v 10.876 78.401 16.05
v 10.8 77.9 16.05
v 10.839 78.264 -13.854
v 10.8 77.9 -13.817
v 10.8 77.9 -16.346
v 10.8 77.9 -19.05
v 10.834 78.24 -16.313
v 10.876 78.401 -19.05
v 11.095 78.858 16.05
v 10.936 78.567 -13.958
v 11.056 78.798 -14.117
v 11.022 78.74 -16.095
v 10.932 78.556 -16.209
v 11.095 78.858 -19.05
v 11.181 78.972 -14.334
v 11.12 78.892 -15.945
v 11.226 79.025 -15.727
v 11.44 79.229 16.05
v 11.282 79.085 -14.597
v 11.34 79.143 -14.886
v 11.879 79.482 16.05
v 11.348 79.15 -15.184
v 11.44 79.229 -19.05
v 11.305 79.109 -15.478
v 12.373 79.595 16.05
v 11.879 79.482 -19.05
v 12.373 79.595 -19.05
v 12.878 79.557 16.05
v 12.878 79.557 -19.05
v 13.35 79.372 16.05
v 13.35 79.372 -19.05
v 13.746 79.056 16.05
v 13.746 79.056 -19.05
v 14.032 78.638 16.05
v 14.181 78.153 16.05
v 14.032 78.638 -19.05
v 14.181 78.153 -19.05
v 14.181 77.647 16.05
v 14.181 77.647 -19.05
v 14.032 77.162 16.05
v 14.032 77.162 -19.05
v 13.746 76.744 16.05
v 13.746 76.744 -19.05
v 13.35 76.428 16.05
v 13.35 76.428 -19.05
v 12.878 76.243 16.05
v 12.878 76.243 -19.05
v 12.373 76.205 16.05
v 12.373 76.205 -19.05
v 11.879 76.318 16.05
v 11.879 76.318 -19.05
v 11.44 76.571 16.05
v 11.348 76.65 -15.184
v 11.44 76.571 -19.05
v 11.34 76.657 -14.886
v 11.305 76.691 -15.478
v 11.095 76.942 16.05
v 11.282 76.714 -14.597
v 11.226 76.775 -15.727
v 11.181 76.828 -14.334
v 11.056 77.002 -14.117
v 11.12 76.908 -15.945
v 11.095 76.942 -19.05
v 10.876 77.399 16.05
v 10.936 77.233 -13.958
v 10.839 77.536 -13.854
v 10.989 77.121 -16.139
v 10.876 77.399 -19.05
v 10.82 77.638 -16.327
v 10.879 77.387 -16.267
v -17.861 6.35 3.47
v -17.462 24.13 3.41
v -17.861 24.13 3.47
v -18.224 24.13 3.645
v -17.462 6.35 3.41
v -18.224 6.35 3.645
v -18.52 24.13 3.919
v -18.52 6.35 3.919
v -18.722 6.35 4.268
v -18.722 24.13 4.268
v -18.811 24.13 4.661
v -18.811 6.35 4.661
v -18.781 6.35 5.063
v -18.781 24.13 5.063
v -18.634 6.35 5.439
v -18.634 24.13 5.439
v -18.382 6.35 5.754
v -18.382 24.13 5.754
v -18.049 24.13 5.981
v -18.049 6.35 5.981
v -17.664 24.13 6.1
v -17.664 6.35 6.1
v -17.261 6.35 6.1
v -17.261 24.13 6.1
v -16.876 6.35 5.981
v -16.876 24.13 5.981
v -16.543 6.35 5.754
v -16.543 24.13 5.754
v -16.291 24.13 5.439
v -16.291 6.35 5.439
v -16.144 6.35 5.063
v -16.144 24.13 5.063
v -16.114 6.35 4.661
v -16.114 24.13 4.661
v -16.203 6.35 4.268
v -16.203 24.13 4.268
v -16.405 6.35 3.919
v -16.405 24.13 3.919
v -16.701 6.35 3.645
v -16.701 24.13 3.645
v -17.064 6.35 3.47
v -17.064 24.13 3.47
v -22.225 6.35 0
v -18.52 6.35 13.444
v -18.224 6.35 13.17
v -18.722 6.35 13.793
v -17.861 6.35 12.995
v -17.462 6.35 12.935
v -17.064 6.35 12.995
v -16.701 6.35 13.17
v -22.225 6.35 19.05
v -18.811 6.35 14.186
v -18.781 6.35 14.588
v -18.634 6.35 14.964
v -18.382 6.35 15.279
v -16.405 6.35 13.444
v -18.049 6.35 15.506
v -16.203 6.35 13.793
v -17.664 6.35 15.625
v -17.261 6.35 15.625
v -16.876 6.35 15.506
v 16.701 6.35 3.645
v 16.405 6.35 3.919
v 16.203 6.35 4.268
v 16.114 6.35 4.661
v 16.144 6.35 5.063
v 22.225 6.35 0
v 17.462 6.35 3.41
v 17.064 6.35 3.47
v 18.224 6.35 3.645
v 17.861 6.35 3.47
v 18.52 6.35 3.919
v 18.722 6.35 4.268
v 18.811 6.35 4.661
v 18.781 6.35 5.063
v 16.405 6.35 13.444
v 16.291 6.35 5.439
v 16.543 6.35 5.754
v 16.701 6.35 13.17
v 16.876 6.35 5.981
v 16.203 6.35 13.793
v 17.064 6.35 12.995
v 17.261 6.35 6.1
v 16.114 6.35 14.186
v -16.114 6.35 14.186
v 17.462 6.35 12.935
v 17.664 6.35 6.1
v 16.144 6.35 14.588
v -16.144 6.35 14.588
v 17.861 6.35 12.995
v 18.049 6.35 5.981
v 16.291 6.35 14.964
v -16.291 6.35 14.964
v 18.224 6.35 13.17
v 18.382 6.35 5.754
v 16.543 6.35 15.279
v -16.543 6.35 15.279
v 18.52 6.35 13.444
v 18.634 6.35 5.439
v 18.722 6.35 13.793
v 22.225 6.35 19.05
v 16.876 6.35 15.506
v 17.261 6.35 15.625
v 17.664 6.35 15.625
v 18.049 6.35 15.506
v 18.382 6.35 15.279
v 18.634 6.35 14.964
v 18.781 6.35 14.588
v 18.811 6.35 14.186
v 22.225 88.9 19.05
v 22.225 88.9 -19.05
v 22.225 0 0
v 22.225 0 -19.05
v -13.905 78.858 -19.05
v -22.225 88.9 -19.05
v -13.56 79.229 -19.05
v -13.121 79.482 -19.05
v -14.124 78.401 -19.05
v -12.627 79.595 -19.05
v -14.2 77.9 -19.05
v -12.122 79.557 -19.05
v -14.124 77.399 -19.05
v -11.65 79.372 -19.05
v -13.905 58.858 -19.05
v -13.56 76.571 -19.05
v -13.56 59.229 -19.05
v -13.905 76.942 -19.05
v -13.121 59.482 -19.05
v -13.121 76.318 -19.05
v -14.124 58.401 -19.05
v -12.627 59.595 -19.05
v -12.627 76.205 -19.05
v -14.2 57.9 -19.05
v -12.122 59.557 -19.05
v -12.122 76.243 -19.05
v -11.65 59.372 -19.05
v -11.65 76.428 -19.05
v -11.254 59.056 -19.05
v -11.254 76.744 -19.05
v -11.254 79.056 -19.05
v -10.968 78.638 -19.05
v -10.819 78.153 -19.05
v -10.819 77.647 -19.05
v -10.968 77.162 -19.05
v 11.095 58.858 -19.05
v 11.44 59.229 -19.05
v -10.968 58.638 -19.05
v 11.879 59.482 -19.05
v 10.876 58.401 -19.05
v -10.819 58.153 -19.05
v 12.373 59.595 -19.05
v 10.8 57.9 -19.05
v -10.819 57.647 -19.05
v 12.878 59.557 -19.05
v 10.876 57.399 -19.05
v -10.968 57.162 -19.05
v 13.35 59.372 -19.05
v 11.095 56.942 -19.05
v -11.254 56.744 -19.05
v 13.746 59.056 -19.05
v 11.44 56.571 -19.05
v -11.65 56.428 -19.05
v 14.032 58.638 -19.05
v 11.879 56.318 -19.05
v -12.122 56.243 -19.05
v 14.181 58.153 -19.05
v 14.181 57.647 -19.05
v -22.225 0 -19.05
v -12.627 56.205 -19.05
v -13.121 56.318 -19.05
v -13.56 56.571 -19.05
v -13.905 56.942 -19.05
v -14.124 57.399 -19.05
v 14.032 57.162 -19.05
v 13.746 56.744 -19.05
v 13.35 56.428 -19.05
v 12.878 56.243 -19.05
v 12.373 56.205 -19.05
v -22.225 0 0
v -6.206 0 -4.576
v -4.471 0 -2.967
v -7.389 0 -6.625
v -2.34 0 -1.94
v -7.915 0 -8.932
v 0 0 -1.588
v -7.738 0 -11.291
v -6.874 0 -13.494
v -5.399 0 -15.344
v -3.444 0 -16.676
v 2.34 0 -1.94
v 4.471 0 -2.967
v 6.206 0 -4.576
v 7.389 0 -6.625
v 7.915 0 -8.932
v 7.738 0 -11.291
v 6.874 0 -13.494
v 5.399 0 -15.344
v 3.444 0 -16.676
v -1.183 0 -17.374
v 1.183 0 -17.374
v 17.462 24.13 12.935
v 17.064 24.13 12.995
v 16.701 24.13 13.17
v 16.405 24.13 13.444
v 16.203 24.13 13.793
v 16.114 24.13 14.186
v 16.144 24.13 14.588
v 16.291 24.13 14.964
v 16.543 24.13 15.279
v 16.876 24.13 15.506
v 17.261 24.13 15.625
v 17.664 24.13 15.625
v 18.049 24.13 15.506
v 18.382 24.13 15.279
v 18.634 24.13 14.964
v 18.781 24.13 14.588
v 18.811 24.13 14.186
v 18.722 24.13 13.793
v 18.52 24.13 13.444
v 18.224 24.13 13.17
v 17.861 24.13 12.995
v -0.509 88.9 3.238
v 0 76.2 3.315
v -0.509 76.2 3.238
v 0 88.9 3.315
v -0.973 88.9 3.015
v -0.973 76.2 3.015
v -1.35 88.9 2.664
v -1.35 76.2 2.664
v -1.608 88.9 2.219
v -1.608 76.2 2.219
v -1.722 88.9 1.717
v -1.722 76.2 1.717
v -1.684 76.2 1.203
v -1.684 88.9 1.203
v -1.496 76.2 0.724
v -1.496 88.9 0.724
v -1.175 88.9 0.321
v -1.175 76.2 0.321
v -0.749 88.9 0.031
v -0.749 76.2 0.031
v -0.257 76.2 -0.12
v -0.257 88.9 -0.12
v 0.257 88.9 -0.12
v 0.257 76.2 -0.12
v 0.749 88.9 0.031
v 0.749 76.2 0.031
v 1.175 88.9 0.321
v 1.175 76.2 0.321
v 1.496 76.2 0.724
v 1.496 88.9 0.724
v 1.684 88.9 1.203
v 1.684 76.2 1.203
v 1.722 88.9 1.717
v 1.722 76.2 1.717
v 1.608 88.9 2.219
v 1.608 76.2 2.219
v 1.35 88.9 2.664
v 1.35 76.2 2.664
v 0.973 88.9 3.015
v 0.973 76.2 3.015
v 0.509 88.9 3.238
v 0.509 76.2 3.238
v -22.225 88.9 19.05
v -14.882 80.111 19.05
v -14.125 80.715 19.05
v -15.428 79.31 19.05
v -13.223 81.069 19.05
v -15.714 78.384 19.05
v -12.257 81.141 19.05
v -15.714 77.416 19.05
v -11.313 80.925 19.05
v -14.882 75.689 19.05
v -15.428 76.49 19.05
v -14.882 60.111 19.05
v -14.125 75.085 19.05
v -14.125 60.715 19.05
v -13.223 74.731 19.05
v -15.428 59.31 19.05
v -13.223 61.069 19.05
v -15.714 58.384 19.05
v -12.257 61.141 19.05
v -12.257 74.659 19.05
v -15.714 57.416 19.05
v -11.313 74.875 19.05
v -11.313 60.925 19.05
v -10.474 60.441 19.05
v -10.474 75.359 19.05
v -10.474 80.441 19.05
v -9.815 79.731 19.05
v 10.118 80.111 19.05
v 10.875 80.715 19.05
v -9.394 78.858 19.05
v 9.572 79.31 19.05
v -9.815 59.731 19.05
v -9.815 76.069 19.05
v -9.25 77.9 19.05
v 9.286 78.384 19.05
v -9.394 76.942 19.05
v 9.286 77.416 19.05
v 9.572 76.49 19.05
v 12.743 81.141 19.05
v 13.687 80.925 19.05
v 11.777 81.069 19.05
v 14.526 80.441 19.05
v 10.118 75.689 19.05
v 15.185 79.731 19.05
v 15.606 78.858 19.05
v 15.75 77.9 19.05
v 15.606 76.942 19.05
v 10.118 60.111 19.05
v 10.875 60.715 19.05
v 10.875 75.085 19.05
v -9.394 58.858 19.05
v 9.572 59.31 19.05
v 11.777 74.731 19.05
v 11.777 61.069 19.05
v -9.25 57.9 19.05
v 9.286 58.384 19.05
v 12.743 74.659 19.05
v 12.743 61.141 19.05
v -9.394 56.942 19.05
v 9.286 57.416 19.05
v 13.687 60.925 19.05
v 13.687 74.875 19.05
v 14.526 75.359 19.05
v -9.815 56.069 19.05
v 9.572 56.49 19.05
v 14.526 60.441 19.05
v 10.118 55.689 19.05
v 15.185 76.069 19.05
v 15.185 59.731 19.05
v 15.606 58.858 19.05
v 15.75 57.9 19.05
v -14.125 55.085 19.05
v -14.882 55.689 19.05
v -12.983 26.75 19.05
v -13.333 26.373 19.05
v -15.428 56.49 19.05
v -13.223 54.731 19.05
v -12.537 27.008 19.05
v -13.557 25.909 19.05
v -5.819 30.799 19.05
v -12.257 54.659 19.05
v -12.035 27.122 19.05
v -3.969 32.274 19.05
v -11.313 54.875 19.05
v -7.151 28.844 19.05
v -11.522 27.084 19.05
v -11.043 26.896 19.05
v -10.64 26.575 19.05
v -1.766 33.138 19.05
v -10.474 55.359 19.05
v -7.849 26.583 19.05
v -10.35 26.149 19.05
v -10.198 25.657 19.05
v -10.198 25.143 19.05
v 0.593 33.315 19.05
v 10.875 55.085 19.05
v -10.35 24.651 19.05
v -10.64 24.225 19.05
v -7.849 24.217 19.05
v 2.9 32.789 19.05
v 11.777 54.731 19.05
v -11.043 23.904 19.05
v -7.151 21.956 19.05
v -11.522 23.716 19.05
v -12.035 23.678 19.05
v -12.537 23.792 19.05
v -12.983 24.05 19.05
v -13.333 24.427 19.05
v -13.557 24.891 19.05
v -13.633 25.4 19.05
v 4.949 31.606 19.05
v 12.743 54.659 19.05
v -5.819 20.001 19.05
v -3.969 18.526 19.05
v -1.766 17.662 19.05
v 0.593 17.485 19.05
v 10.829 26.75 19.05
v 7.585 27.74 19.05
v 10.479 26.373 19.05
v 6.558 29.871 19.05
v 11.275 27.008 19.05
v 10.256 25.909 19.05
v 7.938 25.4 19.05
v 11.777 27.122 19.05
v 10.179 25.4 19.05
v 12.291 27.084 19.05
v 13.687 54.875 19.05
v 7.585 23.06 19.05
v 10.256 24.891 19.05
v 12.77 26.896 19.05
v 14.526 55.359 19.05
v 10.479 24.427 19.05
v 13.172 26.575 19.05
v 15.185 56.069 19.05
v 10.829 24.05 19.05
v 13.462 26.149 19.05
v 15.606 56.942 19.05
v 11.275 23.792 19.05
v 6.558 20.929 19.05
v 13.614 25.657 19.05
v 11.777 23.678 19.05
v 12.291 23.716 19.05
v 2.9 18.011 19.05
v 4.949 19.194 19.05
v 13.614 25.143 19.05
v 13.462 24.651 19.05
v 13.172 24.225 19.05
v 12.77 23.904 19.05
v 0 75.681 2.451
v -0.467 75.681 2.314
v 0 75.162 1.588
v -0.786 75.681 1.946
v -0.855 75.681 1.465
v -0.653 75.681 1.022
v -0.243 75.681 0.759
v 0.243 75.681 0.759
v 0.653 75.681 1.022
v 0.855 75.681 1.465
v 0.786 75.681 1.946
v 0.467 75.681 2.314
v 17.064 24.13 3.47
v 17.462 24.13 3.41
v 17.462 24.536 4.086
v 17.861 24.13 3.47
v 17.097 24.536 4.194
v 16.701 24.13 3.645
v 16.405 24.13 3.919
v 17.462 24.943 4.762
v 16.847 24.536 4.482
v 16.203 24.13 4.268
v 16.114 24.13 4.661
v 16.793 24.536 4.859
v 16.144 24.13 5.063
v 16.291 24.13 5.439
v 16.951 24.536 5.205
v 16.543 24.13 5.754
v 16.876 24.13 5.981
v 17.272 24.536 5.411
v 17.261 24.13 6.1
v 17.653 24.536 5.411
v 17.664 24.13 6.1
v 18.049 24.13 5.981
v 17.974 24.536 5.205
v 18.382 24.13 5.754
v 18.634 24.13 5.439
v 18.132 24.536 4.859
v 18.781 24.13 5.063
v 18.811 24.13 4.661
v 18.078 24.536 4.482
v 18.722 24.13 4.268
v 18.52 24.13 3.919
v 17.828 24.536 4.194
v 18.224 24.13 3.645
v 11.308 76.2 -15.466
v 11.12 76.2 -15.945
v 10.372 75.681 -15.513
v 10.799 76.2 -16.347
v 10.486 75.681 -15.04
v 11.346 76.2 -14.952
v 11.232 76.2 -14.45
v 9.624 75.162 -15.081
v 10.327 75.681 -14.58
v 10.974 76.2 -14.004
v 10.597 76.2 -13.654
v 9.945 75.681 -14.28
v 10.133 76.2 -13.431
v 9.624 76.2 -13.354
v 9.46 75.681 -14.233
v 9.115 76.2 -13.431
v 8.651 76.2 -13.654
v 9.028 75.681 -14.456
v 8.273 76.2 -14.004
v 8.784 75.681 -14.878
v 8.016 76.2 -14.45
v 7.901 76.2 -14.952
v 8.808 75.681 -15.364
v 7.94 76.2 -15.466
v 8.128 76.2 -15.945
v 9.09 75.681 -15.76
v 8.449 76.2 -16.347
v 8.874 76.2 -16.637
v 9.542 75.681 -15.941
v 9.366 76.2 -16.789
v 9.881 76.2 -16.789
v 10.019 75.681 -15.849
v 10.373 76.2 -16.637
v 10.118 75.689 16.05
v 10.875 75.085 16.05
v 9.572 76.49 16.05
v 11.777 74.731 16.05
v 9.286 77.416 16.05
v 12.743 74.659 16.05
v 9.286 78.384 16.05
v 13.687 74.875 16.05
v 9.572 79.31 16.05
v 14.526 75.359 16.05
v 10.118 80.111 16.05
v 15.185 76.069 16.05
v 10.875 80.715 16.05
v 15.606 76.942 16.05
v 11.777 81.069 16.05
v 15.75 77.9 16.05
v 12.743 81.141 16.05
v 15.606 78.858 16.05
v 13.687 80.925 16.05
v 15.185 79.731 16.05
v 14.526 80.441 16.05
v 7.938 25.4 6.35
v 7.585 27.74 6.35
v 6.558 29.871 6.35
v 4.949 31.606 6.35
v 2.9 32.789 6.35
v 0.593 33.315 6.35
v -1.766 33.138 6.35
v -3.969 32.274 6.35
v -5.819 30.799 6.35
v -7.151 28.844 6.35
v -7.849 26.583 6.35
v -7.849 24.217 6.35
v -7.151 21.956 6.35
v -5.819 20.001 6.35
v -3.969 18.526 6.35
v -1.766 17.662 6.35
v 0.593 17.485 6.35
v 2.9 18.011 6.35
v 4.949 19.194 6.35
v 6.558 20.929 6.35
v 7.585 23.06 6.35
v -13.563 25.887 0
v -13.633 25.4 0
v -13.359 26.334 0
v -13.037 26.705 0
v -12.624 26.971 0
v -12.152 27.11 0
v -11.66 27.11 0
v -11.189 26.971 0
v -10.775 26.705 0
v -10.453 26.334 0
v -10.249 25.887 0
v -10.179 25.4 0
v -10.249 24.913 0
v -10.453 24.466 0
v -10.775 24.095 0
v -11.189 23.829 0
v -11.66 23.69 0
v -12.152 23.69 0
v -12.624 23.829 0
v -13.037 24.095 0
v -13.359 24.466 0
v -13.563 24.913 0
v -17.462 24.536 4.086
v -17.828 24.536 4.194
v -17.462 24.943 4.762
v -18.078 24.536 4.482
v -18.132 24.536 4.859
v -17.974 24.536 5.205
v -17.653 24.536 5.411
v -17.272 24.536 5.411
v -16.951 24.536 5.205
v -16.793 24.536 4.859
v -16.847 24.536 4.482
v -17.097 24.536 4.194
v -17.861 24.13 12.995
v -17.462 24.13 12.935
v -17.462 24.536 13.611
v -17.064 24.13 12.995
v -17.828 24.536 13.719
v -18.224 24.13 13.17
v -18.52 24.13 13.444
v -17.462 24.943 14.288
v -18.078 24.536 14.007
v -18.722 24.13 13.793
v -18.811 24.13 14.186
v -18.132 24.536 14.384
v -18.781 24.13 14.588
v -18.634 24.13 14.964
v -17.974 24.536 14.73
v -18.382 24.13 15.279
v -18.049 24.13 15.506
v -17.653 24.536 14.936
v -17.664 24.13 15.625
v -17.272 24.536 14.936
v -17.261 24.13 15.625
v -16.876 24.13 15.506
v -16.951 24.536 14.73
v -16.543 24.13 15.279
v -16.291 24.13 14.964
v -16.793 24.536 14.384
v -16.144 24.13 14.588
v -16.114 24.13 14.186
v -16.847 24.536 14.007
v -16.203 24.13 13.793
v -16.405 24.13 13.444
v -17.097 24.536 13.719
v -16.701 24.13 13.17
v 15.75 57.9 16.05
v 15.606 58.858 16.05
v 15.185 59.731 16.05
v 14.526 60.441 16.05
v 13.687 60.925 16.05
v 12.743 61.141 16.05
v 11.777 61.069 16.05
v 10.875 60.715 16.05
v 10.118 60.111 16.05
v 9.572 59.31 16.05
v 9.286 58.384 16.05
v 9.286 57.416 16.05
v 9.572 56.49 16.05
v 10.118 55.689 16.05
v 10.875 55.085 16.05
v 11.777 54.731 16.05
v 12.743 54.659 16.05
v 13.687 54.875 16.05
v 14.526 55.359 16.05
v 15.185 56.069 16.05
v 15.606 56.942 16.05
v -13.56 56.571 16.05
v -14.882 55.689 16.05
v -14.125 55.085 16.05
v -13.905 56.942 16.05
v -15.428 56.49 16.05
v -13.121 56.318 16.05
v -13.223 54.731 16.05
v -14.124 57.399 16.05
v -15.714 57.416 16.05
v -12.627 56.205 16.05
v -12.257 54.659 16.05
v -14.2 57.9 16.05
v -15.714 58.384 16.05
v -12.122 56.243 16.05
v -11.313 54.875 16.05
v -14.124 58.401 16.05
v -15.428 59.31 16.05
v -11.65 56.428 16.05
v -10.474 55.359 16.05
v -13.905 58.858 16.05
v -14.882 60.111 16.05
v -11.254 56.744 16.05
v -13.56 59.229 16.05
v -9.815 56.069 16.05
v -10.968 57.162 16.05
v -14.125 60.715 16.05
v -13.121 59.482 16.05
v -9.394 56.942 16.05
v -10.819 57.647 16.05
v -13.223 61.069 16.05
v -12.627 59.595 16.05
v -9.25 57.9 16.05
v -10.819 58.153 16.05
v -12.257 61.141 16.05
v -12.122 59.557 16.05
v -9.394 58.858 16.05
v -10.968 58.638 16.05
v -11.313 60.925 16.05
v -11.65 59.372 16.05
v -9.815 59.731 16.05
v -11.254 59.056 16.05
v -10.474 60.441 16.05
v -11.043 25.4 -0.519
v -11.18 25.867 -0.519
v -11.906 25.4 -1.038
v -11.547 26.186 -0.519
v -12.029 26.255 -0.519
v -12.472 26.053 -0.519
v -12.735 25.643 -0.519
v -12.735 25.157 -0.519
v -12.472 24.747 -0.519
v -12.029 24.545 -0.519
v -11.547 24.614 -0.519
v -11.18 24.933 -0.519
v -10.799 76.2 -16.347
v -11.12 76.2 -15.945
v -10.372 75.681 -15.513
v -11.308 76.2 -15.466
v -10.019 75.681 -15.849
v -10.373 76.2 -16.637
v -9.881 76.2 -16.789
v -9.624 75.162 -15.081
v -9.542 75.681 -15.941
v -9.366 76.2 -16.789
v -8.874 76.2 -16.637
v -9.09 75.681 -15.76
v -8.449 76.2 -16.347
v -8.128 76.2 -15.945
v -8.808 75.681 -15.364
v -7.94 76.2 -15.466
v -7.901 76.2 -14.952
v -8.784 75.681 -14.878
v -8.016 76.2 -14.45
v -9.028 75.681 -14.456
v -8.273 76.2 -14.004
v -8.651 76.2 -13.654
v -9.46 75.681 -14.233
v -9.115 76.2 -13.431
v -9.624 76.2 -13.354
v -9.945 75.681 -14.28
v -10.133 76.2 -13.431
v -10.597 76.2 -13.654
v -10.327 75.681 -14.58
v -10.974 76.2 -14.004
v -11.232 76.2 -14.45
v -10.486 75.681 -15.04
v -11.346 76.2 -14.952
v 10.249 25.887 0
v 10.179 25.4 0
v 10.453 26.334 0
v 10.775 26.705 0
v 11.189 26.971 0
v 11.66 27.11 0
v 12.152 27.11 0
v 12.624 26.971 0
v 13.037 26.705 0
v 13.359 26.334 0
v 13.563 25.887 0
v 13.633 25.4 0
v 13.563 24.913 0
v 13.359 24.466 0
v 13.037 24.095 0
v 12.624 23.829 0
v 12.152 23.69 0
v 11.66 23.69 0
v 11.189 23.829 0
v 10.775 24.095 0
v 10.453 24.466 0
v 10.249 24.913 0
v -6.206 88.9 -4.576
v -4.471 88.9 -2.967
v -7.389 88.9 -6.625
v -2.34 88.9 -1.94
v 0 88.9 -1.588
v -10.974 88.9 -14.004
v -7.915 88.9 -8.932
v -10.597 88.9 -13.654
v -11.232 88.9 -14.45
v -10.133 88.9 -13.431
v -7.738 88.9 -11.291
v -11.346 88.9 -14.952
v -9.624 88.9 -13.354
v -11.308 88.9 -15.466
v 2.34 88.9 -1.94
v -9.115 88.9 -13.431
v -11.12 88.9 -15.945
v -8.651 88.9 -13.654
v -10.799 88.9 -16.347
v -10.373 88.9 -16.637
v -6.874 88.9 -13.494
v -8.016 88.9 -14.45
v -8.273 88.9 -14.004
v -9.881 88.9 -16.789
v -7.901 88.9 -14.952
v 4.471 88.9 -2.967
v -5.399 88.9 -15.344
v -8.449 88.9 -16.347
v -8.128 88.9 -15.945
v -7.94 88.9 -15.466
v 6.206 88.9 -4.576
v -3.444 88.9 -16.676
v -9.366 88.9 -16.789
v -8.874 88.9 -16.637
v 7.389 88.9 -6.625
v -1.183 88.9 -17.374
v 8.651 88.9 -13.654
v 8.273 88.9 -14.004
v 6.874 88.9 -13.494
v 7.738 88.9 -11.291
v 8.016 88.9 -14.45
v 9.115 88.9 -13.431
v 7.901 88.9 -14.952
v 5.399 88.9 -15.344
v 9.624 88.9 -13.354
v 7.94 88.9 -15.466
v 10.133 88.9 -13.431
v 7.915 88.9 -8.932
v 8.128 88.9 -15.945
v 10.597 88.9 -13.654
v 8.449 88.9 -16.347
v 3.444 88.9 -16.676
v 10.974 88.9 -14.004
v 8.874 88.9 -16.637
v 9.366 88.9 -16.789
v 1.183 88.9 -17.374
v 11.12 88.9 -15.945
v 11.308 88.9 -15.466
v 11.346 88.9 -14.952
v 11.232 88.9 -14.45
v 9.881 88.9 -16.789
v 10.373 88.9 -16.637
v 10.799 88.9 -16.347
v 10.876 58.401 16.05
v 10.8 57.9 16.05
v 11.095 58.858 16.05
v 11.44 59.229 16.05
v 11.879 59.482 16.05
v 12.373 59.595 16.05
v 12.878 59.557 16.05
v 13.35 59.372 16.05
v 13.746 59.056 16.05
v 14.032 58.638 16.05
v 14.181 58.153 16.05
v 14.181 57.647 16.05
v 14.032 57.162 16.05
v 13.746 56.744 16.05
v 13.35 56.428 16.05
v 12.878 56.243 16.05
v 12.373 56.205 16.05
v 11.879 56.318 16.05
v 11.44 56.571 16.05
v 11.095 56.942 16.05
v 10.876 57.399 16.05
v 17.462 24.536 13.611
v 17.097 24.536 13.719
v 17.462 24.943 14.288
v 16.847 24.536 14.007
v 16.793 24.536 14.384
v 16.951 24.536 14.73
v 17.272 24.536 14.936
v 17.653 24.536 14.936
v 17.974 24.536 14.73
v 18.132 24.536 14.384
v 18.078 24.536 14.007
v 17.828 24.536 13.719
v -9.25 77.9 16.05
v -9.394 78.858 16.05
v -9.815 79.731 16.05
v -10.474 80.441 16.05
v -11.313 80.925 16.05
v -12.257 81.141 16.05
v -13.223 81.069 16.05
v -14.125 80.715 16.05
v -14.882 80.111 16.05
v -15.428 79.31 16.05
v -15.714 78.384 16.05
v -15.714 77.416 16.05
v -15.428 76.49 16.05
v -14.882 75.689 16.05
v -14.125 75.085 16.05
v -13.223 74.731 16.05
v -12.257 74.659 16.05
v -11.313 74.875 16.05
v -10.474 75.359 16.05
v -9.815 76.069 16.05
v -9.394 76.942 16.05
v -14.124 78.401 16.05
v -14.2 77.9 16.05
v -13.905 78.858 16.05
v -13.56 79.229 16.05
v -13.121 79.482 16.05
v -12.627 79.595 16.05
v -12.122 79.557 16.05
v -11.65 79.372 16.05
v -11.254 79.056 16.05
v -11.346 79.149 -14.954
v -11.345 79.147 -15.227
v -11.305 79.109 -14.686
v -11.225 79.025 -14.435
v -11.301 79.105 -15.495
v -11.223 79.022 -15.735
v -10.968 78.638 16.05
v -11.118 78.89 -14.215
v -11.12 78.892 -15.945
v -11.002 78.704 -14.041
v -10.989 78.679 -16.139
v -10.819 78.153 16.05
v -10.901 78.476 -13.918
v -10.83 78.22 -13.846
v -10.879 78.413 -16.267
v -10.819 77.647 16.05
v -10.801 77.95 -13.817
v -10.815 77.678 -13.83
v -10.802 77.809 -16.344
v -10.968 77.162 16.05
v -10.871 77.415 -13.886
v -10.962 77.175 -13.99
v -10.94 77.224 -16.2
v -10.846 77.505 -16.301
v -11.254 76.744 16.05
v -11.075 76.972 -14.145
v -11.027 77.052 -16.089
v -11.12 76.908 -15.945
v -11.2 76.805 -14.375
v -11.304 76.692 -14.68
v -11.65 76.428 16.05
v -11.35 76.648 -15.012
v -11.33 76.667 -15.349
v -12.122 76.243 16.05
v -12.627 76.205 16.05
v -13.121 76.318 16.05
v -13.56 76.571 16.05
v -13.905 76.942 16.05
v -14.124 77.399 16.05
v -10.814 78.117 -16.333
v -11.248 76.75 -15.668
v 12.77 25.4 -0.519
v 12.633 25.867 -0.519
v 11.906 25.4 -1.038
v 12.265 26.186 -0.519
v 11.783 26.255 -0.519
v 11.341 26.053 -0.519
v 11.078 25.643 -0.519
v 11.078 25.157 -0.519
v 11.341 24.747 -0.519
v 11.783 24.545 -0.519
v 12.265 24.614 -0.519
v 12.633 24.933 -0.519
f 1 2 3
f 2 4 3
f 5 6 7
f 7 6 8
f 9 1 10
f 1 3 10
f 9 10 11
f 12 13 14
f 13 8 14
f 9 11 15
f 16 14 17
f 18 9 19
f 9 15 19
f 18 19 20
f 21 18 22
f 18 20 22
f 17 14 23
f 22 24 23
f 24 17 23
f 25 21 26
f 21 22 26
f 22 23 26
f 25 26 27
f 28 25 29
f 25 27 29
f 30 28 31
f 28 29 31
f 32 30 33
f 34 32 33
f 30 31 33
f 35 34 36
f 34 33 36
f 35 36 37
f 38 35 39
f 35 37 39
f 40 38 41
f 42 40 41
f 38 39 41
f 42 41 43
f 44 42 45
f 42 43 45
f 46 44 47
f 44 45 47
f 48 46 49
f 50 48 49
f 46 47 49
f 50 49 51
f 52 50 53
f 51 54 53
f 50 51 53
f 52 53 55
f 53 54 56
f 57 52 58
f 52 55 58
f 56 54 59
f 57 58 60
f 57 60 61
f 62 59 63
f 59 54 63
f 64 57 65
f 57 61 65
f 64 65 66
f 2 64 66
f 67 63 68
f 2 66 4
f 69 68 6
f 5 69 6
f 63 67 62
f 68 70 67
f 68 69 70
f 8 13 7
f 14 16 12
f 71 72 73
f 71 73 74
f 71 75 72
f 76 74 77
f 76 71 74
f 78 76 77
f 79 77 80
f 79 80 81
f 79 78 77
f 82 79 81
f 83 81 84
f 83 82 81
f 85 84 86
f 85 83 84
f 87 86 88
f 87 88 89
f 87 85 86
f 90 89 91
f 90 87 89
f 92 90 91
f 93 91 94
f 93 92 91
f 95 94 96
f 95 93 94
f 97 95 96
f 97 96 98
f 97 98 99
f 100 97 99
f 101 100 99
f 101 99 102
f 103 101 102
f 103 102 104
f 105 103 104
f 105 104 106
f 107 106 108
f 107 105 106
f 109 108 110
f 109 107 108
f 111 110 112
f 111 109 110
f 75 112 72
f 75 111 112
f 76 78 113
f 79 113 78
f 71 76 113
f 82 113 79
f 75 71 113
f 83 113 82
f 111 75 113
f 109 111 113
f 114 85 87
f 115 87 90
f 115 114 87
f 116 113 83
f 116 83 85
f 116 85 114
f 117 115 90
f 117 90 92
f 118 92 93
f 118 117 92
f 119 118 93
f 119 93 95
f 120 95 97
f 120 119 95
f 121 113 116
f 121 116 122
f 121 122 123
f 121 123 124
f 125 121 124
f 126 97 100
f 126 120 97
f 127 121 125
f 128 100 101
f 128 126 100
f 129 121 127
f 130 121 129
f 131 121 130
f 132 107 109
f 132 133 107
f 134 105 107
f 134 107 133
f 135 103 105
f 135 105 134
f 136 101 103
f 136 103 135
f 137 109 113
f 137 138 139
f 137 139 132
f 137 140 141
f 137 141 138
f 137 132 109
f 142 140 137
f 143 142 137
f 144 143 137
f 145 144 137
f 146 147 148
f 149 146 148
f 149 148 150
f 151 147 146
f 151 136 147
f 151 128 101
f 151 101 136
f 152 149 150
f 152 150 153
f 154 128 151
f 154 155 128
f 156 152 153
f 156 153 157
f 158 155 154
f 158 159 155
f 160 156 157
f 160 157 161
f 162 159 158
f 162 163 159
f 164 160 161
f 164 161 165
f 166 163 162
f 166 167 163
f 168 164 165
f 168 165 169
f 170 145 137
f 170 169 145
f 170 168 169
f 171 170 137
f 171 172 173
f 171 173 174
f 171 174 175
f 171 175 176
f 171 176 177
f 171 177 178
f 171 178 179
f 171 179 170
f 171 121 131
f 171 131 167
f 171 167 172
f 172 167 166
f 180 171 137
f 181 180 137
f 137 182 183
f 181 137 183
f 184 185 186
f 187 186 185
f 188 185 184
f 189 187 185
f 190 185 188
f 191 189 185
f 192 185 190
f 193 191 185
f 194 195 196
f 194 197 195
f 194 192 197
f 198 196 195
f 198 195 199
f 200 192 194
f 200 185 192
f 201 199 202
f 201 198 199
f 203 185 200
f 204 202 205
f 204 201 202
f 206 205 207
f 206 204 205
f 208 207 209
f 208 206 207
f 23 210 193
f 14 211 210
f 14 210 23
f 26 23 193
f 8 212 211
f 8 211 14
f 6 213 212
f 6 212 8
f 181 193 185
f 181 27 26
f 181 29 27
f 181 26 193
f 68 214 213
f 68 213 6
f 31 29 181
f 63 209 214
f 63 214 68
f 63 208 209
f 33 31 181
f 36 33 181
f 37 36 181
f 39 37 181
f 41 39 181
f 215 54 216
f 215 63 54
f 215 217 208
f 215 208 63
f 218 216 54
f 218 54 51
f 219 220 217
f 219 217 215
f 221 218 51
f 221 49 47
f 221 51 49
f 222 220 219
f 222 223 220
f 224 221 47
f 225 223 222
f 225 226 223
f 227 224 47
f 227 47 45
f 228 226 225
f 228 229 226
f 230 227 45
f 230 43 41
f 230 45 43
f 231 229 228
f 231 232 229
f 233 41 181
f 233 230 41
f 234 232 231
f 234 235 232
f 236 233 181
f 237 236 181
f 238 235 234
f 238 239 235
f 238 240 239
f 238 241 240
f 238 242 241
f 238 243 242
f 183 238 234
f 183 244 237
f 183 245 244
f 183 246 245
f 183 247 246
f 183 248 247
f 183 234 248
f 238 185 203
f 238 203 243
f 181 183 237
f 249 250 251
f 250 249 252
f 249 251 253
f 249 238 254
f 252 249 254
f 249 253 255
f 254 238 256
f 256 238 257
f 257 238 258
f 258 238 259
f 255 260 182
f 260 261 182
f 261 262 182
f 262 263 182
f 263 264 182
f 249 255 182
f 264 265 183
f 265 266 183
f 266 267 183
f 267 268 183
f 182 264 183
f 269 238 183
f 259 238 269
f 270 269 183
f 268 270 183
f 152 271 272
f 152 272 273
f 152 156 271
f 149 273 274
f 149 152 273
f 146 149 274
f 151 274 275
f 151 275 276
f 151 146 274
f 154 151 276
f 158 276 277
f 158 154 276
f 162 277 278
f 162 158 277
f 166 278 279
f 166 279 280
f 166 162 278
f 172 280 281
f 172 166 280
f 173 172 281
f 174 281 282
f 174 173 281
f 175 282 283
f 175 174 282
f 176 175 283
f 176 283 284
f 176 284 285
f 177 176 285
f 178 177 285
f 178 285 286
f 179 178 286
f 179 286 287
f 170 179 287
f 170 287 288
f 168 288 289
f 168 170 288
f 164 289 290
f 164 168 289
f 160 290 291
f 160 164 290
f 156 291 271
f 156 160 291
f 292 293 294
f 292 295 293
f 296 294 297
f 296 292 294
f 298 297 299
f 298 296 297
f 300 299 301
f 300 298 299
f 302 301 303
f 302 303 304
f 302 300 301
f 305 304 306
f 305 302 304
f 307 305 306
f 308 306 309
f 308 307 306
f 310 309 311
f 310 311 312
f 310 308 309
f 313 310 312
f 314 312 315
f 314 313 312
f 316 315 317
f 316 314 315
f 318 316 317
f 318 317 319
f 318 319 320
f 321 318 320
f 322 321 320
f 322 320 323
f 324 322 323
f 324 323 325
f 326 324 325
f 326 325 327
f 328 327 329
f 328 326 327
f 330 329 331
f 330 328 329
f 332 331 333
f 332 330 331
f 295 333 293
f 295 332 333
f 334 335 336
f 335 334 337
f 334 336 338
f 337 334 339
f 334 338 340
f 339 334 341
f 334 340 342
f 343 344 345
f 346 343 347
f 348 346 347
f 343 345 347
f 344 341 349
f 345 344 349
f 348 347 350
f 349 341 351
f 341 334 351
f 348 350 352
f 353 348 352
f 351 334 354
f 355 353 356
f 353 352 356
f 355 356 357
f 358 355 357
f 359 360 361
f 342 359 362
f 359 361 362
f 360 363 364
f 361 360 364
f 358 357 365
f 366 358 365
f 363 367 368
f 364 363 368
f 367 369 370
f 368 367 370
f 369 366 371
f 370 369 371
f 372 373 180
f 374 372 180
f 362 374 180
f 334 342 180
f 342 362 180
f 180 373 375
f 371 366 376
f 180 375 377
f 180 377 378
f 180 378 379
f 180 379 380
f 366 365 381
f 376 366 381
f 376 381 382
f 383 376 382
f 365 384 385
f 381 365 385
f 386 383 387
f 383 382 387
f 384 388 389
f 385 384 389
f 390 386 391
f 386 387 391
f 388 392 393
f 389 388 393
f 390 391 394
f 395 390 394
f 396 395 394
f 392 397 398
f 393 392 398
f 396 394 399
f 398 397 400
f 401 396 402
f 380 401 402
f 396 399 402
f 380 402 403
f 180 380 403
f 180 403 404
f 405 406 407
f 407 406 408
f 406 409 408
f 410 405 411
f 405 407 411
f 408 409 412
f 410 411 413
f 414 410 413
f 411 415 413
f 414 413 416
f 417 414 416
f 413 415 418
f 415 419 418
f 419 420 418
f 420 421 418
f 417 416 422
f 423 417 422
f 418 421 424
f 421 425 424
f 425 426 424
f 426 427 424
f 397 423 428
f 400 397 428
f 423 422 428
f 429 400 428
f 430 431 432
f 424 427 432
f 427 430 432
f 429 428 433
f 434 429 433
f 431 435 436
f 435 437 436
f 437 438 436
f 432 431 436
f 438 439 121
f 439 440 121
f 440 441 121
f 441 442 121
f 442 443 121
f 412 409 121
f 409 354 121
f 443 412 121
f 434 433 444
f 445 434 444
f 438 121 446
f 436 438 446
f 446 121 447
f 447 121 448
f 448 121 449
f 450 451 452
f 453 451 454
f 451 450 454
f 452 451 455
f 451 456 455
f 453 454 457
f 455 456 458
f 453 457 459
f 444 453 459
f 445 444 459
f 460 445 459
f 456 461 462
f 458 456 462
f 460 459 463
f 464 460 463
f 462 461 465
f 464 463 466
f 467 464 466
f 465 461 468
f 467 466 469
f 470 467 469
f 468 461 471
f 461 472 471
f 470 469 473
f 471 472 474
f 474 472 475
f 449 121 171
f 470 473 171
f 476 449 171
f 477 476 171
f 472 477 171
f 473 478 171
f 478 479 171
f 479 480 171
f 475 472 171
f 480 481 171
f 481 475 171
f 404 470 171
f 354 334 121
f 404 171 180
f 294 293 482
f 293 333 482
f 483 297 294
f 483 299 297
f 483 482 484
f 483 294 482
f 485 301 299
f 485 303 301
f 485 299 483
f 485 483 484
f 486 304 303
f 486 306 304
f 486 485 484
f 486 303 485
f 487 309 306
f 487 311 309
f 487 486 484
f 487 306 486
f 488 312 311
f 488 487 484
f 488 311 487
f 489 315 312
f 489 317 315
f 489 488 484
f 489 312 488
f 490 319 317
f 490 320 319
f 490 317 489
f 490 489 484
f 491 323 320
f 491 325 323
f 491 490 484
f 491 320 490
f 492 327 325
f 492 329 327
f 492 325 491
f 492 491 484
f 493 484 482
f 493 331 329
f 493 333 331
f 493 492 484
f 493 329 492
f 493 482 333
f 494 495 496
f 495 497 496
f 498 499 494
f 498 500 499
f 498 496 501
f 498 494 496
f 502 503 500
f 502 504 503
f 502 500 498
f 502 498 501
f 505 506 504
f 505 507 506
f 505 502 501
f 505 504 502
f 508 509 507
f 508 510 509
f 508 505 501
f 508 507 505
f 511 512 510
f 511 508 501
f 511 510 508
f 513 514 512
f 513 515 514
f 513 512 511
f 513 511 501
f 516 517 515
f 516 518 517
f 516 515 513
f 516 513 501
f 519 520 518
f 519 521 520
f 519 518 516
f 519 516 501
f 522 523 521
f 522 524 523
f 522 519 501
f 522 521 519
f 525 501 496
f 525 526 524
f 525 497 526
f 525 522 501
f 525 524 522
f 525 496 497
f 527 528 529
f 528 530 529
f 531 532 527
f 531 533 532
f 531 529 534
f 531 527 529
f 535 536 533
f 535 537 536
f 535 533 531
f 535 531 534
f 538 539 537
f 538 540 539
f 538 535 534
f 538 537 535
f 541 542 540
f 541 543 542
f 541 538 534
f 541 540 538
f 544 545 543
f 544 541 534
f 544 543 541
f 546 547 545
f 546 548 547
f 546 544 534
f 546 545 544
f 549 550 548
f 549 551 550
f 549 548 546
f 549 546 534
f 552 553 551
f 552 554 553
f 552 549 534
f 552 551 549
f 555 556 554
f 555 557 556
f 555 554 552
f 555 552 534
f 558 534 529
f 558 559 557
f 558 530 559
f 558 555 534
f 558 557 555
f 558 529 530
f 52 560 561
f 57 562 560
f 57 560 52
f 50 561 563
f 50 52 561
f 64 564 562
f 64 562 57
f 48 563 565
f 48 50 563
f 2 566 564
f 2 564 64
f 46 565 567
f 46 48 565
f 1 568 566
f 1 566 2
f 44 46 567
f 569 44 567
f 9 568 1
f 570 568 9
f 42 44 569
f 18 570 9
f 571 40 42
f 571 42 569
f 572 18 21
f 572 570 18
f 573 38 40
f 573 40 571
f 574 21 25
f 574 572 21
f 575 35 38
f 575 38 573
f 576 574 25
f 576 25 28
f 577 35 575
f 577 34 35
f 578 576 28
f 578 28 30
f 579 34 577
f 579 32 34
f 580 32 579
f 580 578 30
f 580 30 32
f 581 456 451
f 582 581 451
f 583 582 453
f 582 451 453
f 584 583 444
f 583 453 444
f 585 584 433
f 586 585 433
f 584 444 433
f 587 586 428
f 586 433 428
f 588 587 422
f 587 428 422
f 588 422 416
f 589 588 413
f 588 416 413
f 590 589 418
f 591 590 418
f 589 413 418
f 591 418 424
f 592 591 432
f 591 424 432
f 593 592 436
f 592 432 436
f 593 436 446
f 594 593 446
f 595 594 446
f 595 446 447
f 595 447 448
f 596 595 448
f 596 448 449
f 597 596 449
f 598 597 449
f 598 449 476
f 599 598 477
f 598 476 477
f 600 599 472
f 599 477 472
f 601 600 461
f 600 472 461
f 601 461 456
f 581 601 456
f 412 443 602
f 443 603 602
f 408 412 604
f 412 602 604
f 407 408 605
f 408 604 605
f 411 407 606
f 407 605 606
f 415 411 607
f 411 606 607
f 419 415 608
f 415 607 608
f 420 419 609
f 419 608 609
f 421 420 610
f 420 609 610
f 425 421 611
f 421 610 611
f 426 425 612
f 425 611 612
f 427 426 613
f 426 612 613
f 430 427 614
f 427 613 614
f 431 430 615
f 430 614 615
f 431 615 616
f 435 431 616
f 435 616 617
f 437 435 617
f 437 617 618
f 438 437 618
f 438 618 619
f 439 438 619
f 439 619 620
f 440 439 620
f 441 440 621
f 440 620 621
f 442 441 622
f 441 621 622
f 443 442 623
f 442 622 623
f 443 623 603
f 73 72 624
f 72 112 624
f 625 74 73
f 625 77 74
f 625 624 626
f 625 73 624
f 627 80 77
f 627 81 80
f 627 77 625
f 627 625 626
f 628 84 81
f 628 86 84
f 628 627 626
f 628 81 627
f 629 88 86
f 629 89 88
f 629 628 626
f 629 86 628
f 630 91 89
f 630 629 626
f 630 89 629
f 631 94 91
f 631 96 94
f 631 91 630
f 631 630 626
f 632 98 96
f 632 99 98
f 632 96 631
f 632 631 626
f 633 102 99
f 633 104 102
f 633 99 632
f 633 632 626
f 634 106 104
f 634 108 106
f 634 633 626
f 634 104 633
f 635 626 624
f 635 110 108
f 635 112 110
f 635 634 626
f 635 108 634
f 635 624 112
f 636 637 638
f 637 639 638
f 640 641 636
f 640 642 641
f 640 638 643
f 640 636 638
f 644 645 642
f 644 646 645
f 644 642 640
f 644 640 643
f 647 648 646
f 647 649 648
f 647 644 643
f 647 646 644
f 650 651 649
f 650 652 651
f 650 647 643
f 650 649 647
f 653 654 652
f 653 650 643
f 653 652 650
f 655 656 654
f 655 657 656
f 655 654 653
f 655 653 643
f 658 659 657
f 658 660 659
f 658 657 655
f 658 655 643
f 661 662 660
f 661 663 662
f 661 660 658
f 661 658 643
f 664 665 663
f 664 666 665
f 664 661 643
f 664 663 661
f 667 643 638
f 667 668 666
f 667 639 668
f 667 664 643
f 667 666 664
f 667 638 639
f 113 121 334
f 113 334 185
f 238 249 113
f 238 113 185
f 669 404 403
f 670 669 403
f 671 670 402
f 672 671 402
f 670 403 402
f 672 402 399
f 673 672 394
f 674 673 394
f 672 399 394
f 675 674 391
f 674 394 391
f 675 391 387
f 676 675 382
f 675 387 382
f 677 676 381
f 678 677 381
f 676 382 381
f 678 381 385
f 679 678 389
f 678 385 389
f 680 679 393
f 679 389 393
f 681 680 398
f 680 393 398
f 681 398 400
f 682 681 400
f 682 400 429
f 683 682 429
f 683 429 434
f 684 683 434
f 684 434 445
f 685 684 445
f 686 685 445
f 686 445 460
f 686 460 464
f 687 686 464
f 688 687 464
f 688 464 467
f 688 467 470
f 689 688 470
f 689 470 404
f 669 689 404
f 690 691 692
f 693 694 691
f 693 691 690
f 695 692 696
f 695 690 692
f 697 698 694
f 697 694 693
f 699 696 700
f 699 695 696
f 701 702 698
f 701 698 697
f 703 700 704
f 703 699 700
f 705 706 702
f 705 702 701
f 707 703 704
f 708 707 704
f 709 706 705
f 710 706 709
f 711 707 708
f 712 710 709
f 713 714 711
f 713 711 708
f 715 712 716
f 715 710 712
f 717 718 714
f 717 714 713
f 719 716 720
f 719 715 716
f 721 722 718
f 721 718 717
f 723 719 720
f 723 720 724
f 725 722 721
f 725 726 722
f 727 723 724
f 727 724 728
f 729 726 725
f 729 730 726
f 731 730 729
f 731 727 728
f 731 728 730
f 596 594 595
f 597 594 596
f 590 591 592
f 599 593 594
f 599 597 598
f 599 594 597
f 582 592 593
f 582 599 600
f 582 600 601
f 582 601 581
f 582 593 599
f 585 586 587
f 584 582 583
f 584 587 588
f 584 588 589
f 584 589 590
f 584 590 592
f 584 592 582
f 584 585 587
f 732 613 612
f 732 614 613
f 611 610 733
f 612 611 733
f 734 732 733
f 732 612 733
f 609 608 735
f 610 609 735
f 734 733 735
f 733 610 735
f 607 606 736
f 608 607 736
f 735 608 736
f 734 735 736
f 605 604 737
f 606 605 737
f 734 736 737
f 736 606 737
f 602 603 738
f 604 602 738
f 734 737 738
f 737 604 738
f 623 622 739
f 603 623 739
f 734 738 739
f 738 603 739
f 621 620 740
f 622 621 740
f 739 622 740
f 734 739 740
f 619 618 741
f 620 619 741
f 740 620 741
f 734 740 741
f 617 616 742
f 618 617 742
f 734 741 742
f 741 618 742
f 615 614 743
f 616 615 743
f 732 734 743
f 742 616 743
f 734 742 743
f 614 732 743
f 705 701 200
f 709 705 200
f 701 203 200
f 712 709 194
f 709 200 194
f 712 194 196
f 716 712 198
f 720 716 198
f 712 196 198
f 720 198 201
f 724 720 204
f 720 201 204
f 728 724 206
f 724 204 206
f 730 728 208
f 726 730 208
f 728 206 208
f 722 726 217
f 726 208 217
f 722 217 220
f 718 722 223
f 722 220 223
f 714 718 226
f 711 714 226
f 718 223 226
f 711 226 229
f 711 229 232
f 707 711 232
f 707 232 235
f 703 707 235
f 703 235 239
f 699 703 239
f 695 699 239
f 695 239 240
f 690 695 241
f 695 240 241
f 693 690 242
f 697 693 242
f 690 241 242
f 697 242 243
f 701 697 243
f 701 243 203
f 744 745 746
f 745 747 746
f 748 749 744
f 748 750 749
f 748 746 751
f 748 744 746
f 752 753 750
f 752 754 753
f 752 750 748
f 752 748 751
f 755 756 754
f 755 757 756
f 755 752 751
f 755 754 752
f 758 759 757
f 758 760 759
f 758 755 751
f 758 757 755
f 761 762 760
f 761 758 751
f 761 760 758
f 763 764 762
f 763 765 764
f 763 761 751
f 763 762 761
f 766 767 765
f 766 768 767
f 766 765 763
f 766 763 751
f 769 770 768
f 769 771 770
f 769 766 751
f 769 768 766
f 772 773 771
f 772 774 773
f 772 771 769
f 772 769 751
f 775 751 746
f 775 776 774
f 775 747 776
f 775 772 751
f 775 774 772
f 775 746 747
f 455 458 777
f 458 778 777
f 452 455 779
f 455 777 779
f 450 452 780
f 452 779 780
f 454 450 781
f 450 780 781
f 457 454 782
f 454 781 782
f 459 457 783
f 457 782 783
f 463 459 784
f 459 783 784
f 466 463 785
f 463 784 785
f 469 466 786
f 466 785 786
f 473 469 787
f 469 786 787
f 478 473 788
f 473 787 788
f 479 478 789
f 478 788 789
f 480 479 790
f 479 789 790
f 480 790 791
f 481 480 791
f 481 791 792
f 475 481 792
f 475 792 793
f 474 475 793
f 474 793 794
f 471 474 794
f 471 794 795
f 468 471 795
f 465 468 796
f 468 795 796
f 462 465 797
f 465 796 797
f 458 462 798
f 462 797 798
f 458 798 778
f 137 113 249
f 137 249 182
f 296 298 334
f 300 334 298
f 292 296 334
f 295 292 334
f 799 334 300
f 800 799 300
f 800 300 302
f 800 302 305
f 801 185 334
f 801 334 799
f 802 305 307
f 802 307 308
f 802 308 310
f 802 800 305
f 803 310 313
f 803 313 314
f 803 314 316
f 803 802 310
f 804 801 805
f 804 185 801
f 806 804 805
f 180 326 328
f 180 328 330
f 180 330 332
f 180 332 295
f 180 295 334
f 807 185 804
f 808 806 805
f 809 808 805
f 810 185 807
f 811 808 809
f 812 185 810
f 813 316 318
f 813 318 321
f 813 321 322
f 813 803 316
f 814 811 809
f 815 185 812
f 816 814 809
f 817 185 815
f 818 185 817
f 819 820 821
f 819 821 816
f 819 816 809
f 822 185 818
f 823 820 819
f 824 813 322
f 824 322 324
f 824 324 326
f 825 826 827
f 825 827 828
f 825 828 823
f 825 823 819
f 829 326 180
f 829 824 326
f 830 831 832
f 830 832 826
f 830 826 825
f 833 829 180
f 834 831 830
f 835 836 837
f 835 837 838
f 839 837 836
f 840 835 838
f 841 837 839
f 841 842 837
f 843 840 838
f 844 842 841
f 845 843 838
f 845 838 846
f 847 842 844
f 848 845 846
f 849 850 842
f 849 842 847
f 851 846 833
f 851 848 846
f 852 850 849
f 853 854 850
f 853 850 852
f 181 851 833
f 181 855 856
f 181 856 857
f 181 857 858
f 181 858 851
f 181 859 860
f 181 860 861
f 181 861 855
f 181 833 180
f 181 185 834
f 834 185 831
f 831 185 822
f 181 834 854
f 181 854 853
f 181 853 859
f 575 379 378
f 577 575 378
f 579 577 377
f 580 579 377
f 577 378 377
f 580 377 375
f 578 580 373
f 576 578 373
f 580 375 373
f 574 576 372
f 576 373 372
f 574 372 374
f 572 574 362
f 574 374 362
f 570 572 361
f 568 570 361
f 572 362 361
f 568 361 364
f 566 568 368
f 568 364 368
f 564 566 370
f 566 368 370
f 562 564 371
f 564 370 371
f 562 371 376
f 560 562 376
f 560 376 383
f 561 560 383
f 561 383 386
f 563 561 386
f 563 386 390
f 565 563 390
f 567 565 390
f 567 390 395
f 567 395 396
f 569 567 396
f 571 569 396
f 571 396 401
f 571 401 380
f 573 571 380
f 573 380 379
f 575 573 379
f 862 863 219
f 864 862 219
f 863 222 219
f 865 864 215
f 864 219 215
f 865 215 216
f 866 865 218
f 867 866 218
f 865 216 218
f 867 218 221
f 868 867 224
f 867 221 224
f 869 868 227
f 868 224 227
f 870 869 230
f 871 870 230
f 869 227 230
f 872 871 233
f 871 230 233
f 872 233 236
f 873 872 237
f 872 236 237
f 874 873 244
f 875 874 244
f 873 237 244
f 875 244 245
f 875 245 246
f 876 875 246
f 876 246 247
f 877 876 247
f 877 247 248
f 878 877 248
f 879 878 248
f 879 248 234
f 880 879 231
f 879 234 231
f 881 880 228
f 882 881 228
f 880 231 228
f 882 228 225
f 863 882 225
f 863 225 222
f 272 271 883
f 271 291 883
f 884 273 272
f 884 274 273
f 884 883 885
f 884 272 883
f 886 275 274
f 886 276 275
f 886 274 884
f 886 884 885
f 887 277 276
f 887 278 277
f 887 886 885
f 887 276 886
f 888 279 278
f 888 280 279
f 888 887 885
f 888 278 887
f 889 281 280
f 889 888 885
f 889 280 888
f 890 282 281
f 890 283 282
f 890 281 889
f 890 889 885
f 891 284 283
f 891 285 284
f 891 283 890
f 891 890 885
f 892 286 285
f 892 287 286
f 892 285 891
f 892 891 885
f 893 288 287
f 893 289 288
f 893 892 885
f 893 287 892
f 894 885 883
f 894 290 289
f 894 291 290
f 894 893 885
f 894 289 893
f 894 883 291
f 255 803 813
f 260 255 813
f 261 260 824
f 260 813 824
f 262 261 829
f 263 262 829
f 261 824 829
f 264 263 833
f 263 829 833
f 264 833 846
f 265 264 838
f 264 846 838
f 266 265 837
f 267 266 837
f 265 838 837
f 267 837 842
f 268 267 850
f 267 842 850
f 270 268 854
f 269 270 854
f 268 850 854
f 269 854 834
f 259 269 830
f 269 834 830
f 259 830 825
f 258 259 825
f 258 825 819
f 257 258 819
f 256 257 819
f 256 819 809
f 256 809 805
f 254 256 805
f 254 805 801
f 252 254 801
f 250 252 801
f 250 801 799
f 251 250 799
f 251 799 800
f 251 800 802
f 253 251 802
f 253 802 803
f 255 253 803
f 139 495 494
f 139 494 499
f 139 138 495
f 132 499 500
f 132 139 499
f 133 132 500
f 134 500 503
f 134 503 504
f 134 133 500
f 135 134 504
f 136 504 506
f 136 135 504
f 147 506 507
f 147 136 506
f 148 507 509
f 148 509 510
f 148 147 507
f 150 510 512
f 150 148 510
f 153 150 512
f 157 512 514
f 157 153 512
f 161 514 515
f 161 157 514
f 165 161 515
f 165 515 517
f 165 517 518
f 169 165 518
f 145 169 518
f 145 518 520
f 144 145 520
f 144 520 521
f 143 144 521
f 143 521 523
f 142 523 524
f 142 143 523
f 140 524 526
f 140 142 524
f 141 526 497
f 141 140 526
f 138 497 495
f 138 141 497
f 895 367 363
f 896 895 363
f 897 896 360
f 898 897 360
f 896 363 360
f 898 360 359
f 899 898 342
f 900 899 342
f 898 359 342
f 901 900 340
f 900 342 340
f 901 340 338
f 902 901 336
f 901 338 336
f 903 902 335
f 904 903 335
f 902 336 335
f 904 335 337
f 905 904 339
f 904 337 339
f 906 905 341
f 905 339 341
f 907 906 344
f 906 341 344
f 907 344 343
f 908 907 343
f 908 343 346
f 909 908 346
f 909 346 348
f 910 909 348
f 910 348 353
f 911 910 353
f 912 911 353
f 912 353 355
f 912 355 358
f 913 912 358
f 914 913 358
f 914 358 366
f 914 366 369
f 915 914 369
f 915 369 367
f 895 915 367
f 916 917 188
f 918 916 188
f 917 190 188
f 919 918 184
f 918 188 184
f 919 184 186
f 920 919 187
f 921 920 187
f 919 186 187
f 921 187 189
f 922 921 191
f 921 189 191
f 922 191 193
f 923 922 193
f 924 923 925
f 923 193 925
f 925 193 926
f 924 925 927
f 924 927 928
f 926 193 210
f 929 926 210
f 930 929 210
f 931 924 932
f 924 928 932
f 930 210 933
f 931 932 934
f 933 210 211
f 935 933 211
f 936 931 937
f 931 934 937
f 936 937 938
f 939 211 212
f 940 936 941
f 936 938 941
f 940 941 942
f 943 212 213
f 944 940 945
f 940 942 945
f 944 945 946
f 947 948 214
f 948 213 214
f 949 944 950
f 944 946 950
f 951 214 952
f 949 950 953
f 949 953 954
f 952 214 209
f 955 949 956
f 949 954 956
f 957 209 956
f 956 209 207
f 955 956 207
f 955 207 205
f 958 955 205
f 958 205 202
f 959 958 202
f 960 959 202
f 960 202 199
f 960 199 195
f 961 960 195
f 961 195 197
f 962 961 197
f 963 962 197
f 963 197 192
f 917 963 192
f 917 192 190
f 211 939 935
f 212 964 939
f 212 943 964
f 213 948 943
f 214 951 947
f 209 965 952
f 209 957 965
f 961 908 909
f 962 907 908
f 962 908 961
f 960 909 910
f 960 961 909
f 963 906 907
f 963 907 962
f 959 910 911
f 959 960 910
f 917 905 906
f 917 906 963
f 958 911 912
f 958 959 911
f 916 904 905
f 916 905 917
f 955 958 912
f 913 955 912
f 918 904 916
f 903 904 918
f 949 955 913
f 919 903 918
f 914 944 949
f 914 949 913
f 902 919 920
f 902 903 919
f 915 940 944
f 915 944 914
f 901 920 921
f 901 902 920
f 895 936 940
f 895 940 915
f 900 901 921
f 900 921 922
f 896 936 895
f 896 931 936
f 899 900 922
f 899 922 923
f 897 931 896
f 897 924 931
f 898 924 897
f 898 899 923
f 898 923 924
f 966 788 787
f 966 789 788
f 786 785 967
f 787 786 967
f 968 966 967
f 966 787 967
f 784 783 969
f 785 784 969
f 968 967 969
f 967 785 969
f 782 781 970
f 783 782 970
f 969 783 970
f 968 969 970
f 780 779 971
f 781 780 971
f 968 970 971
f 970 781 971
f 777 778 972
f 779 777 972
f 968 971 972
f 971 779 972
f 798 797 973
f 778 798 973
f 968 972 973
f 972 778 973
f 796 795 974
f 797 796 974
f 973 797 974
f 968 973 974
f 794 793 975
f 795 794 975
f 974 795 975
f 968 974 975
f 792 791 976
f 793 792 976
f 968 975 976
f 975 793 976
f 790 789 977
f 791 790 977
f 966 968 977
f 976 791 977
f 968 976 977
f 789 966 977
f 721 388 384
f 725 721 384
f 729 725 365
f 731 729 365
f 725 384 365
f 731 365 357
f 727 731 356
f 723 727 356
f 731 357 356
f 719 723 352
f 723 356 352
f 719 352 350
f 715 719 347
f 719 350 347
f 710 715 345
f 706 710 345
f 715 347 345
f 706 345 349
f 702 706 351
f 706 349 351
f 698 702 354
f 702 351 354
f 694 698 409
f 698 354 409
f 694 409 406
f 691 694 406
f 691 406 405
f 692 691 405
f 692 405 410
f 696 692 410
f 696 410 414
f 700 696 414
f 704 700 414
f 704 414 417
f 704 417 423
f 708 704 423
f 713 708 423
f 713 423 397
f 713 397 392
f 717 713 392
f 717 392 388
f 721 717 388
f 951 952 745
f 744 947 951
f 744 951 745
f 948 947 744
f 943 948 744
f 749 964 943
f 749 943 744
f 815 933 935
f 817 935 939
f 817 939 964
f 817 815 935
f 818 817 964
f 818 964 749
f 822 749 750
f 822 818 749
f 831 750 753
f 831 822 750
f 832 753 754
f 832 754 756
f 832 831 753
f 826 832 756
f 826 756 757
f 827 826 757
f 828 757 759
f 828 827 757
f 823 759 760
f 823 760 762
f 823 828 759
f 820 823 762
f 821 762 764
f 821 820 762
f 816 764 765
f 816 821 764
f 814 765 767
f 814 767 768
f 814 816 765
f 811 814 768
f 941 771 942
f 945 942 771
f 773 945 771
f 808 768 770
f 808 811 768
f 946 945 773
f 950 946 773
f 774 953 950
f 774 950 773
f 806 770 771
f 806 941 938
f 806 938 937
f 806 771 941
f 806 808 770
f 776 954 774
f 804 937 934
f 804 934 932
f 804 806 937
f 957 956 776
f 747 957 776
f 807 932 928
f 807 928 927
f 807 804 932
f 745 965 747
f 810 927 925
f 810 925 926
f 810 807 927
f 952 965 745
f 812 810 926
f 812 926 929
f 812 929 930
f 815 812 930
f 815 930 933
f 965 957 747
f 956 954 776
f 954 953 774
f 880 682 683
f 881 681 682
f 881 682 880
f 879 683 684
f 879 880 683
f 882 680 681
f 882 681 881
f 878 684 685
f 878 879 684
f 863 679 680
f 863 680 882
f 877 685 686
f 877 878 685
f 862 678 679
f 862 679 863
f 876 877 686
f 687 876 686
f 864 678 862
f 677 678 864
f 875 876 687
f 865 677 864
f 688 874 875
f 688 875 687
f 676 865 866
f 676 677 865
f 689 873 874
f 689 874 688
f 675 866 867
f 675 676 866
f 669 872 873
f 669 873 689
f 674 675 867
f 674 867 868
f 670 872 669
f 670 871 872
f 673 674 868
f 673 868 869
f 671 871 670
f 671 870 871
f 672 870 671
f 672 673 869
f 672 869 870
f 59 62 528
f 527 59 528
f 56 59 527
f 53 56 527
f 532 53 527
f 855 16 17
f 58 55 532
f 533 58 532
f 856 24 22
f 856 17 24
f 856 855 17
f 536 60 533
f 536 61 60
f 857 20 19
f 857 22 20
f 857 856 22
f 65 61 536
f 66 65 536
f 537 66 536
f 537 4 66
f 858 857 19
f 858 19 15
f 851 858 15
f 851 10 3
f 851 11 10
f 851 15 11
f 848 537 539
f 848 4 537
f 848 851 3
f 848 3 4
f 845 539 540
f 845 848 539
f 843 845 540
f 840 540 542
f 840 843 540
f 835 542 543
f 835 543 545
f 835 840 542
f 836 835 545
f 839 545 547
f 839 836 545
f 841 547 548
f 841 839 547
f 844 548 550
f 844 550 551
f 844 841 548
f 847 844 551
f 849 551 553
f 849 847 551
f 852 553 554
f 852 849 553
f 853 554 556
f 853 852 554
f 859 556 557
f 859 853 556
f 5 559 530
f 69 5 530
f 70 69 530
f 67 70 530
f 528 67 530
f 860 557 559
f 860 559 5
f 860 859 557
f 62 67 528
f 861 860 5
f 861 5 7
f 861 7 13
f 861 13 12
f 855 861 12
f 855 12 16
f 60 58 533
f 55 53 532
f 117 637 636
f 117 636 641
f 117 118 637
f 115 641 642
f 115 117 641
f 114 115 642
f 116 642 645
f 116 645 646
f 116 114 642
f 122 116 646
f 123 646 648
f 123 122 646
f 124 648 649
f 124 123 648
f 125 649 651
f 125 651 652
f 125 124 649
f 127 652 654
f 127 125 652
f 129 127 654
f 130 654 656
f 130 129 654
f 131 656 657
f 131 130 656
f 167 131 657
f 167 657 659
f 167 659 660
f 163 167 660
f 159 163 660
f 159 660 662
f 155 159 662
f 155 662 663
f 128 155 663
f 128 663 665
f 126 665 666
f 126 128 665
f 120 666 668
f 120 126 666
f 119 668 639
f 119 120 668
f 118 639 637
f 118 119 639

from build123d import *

# Parameters (mm, degrees)
SKETCH1_W                      = 44.45
SKETCH1_H                      = 38.1
BOSS_EXTRUDE1_DEPTH            = 88.9
SKETCH2_W                      = 44.45
SKETCH2_H                      = 6.35
CUT_EXTRUDE1_DEPTH             = 19.05
CUT_EXTRUDE2_REACH             = 95.595
SKETCH3_R                      = 7.9375
CIRPATTERN1_COUNT              = 3
LPATTERN1_COUNT                = 2
LPATTERN1_PITCH                = 9.525
LPATTERN1_COUNT_DIR2           = 2
LPATTERN1_PITCH_DIR2           = 34.925
CBORE_FOR_M3_SHCS1_D           = 3.4
CBORE_FOR_M3_SHCS1_CBORE_D     = 6.5
CBORE_FOR_M3_SHCS1_CBORE_DEPTH = 3
SKETCH11_R                     = 7.9375
CUT_EXTRUDE3_DEPTH             = 12.7
F_8_32_TAPPED_HOLE1_D          = 3.4544
F_8_32_TAPPED_HOLE1_DEPTH      = 19.05
F_8_32_TAPPED_HOLE1_TIP        = 1.037806461
LPATTERN2_COUNT                = 2
LPATTERN2_PITCH                = 25
LPATTERN2_COUNT_DIR2           = 2
LPATTERN2_PITCH_DIR2           = 20


with BuildPart() as part:
    # Sketch1 → Boss-Extrude1 (new body)
    with BuildSketch(Plane(origin=(0, 0, 0), x_dir=(1, 0, 0), z_dir=(0, 1, 0))):
        Rectangle(SKETCH1_W, SKETCH1_H)
    extrude(amount=BOSS_EXTRUDE1_DEPTH)

    # Sketch2 → Cut-Extrude1 (cut)
    with BuildSketch(Plane.XY.offset(19.05)):
        with Locations((0, 3.175)):
            Rectangle(SKETCH2_W, SKETCH2_H)
    extrude(amount=-CUT_EXTRUDE1_DEPTH, mode=Mode.SUBTRACT)

    # Sketch3 → Cut-Extrude2 (cut, up to next)
    with BuildSketch(Plane(origin=(0, 88.9, 0), x_dir=(1, 0, 0), z_dir=(0, 1, 0)), mode=Mode.PRIVATE) as cut_extrude2_sk1:
        with Locations(Location((0, 9.525, 0), (0, 0, 270))):
            Circle(SKETCH3_R)
    cut_extrude2_tool1 = extrude(cut_extrude2_sk1.sketch, amount=-CUT_EXTRUDE2_REACH, mode=Mode.PRIVATE) & part.part
    add(cut_extrude2_tool1.solids().sort_by_distance((0, 88.9, -9.525))[0], mode=Mode.SUBTRACT)

    # Sketch4 → #8-32 Tapped Hole2 (revolve, cut)
    with BuildSketch(Plane(origin=(0, 88.9, 1.5875), x_dir=(0, 0, 1), z_dir=(1, 0, 0))):
        Polygon((0, 0), (0, 13.737806461), (1.7272, 12.7), (1.7272, 0), align=None)
    f_8_32_tapped_hole2 = revolve(axis=Axis((0, 95.25, 1.5875), (0, -1, 0)), mode=Mode.SUBTRACT)

    # CirPattern1: #8-32 Tapped Hole2 ×3 about axis
    cirpattern1_axis = Axis((0, 0, -9.525), (0, 1, 0))
    for i in range(1, CIRPATTERN1_COUNT):
        add(f_8_32_tapped_hole2.rotate(cirpattern1_axis, i * 360 / CIRPATTERN1_COUNT), mode=Mode.SUBTRACT)

    # Sketch6 → #6-32 Tapped Hole1 (revolve, cut)
    with BuildSketch(Plane(origin=(-17.4625, 6.35, 14.2875), x_dir=(0, 0, -1), z_dir=(1, 0, 0))):
        Polygon((0, 0), (0, 18.59269403), (1.35255, 17.78), (1.35255, 0), align=None)
    f_6_32_tapped_hole1 = revolve(axis=Axis((-17.4625, 0, 14.2875), (0, 1, 0)), mode=Mode.SUBTRACT)

    # LPattern1: 6-32 Tapped Hole1 2 × 2
    with Locations(*[(j * LPATTERN1_PITCH_DIR2, 0, -i * LPATTERN1_PITCH) for i in range(LPATTERN1_COUNT) for j in range(LPATTERN1_COUNT_DIR2) if (i, j) != (0, 0)]):
        add(f_6_32_tapped_hole1, mode=Mode.SUBTRACT)

    # CBORE for M3 SHCS1 (through all)
    with Locations(Plane.XY.offset(19.05)):
        with Locations((-12.5, 77.9)):
            cbore_for_m3_shcs1 = CounterBoreHole(CBORE_FOR_M3_SHCS1_D / 2, CBORE_FOR_M3_SHCS1_CBORE_D / 2, CBORE_FOR_M3_SHCS1_CBORE_DEPTH)

    # Sketch11 → Cut-Extrude3 (cut)
    with BuildSketch(Plane.XY.offset(19.05)):
        with Locations((0, 25.4)):
            Circle(SKETCH11_R)
    extrude(amount=-CUT_EXTRUDE3_DEPTH, mode=Mode.SUBTRACT)

    # #8-32 Tapped Hole1
    with Locations(Plane.XY.offset(19.05)):
        with Locations((-11.90625, 25.4), (11.90625, 25.4)):
            Hole(F_8_32_TAPPED_HOLE1_D / 2, depth=F_8_32_TAPPED_HOLE1_DEPTH)
            with Locations((0, 0, -(F_8_32_TAPPED_HOLE1_DEPTH + F_8_32_TAPPED_HOLE1_TIP / 2))):  # 118° drill point
                Cone(0, F_8_32_TAPPED_HOLE1_D / 2, F_8_32_TAPPED_HOLE1_TIP, mode=Mode.SUBTRACT)

    # LPattern2: CBORE for M3 SHCS1 2 × 2
    with Locations(*[(i * LPATTERN2_PITCH, -j * LPATTERN2_PITCH_DIR2, 0) for i in range(LPATTERN2_COUNT) for j in range(LPATTERN2_COUNT_DIR2) if (i, j) != (0, 0)]):
        add(cbore_for_m3_shcs1, mode=Mode.SUBTRACT)


solid = part.part
